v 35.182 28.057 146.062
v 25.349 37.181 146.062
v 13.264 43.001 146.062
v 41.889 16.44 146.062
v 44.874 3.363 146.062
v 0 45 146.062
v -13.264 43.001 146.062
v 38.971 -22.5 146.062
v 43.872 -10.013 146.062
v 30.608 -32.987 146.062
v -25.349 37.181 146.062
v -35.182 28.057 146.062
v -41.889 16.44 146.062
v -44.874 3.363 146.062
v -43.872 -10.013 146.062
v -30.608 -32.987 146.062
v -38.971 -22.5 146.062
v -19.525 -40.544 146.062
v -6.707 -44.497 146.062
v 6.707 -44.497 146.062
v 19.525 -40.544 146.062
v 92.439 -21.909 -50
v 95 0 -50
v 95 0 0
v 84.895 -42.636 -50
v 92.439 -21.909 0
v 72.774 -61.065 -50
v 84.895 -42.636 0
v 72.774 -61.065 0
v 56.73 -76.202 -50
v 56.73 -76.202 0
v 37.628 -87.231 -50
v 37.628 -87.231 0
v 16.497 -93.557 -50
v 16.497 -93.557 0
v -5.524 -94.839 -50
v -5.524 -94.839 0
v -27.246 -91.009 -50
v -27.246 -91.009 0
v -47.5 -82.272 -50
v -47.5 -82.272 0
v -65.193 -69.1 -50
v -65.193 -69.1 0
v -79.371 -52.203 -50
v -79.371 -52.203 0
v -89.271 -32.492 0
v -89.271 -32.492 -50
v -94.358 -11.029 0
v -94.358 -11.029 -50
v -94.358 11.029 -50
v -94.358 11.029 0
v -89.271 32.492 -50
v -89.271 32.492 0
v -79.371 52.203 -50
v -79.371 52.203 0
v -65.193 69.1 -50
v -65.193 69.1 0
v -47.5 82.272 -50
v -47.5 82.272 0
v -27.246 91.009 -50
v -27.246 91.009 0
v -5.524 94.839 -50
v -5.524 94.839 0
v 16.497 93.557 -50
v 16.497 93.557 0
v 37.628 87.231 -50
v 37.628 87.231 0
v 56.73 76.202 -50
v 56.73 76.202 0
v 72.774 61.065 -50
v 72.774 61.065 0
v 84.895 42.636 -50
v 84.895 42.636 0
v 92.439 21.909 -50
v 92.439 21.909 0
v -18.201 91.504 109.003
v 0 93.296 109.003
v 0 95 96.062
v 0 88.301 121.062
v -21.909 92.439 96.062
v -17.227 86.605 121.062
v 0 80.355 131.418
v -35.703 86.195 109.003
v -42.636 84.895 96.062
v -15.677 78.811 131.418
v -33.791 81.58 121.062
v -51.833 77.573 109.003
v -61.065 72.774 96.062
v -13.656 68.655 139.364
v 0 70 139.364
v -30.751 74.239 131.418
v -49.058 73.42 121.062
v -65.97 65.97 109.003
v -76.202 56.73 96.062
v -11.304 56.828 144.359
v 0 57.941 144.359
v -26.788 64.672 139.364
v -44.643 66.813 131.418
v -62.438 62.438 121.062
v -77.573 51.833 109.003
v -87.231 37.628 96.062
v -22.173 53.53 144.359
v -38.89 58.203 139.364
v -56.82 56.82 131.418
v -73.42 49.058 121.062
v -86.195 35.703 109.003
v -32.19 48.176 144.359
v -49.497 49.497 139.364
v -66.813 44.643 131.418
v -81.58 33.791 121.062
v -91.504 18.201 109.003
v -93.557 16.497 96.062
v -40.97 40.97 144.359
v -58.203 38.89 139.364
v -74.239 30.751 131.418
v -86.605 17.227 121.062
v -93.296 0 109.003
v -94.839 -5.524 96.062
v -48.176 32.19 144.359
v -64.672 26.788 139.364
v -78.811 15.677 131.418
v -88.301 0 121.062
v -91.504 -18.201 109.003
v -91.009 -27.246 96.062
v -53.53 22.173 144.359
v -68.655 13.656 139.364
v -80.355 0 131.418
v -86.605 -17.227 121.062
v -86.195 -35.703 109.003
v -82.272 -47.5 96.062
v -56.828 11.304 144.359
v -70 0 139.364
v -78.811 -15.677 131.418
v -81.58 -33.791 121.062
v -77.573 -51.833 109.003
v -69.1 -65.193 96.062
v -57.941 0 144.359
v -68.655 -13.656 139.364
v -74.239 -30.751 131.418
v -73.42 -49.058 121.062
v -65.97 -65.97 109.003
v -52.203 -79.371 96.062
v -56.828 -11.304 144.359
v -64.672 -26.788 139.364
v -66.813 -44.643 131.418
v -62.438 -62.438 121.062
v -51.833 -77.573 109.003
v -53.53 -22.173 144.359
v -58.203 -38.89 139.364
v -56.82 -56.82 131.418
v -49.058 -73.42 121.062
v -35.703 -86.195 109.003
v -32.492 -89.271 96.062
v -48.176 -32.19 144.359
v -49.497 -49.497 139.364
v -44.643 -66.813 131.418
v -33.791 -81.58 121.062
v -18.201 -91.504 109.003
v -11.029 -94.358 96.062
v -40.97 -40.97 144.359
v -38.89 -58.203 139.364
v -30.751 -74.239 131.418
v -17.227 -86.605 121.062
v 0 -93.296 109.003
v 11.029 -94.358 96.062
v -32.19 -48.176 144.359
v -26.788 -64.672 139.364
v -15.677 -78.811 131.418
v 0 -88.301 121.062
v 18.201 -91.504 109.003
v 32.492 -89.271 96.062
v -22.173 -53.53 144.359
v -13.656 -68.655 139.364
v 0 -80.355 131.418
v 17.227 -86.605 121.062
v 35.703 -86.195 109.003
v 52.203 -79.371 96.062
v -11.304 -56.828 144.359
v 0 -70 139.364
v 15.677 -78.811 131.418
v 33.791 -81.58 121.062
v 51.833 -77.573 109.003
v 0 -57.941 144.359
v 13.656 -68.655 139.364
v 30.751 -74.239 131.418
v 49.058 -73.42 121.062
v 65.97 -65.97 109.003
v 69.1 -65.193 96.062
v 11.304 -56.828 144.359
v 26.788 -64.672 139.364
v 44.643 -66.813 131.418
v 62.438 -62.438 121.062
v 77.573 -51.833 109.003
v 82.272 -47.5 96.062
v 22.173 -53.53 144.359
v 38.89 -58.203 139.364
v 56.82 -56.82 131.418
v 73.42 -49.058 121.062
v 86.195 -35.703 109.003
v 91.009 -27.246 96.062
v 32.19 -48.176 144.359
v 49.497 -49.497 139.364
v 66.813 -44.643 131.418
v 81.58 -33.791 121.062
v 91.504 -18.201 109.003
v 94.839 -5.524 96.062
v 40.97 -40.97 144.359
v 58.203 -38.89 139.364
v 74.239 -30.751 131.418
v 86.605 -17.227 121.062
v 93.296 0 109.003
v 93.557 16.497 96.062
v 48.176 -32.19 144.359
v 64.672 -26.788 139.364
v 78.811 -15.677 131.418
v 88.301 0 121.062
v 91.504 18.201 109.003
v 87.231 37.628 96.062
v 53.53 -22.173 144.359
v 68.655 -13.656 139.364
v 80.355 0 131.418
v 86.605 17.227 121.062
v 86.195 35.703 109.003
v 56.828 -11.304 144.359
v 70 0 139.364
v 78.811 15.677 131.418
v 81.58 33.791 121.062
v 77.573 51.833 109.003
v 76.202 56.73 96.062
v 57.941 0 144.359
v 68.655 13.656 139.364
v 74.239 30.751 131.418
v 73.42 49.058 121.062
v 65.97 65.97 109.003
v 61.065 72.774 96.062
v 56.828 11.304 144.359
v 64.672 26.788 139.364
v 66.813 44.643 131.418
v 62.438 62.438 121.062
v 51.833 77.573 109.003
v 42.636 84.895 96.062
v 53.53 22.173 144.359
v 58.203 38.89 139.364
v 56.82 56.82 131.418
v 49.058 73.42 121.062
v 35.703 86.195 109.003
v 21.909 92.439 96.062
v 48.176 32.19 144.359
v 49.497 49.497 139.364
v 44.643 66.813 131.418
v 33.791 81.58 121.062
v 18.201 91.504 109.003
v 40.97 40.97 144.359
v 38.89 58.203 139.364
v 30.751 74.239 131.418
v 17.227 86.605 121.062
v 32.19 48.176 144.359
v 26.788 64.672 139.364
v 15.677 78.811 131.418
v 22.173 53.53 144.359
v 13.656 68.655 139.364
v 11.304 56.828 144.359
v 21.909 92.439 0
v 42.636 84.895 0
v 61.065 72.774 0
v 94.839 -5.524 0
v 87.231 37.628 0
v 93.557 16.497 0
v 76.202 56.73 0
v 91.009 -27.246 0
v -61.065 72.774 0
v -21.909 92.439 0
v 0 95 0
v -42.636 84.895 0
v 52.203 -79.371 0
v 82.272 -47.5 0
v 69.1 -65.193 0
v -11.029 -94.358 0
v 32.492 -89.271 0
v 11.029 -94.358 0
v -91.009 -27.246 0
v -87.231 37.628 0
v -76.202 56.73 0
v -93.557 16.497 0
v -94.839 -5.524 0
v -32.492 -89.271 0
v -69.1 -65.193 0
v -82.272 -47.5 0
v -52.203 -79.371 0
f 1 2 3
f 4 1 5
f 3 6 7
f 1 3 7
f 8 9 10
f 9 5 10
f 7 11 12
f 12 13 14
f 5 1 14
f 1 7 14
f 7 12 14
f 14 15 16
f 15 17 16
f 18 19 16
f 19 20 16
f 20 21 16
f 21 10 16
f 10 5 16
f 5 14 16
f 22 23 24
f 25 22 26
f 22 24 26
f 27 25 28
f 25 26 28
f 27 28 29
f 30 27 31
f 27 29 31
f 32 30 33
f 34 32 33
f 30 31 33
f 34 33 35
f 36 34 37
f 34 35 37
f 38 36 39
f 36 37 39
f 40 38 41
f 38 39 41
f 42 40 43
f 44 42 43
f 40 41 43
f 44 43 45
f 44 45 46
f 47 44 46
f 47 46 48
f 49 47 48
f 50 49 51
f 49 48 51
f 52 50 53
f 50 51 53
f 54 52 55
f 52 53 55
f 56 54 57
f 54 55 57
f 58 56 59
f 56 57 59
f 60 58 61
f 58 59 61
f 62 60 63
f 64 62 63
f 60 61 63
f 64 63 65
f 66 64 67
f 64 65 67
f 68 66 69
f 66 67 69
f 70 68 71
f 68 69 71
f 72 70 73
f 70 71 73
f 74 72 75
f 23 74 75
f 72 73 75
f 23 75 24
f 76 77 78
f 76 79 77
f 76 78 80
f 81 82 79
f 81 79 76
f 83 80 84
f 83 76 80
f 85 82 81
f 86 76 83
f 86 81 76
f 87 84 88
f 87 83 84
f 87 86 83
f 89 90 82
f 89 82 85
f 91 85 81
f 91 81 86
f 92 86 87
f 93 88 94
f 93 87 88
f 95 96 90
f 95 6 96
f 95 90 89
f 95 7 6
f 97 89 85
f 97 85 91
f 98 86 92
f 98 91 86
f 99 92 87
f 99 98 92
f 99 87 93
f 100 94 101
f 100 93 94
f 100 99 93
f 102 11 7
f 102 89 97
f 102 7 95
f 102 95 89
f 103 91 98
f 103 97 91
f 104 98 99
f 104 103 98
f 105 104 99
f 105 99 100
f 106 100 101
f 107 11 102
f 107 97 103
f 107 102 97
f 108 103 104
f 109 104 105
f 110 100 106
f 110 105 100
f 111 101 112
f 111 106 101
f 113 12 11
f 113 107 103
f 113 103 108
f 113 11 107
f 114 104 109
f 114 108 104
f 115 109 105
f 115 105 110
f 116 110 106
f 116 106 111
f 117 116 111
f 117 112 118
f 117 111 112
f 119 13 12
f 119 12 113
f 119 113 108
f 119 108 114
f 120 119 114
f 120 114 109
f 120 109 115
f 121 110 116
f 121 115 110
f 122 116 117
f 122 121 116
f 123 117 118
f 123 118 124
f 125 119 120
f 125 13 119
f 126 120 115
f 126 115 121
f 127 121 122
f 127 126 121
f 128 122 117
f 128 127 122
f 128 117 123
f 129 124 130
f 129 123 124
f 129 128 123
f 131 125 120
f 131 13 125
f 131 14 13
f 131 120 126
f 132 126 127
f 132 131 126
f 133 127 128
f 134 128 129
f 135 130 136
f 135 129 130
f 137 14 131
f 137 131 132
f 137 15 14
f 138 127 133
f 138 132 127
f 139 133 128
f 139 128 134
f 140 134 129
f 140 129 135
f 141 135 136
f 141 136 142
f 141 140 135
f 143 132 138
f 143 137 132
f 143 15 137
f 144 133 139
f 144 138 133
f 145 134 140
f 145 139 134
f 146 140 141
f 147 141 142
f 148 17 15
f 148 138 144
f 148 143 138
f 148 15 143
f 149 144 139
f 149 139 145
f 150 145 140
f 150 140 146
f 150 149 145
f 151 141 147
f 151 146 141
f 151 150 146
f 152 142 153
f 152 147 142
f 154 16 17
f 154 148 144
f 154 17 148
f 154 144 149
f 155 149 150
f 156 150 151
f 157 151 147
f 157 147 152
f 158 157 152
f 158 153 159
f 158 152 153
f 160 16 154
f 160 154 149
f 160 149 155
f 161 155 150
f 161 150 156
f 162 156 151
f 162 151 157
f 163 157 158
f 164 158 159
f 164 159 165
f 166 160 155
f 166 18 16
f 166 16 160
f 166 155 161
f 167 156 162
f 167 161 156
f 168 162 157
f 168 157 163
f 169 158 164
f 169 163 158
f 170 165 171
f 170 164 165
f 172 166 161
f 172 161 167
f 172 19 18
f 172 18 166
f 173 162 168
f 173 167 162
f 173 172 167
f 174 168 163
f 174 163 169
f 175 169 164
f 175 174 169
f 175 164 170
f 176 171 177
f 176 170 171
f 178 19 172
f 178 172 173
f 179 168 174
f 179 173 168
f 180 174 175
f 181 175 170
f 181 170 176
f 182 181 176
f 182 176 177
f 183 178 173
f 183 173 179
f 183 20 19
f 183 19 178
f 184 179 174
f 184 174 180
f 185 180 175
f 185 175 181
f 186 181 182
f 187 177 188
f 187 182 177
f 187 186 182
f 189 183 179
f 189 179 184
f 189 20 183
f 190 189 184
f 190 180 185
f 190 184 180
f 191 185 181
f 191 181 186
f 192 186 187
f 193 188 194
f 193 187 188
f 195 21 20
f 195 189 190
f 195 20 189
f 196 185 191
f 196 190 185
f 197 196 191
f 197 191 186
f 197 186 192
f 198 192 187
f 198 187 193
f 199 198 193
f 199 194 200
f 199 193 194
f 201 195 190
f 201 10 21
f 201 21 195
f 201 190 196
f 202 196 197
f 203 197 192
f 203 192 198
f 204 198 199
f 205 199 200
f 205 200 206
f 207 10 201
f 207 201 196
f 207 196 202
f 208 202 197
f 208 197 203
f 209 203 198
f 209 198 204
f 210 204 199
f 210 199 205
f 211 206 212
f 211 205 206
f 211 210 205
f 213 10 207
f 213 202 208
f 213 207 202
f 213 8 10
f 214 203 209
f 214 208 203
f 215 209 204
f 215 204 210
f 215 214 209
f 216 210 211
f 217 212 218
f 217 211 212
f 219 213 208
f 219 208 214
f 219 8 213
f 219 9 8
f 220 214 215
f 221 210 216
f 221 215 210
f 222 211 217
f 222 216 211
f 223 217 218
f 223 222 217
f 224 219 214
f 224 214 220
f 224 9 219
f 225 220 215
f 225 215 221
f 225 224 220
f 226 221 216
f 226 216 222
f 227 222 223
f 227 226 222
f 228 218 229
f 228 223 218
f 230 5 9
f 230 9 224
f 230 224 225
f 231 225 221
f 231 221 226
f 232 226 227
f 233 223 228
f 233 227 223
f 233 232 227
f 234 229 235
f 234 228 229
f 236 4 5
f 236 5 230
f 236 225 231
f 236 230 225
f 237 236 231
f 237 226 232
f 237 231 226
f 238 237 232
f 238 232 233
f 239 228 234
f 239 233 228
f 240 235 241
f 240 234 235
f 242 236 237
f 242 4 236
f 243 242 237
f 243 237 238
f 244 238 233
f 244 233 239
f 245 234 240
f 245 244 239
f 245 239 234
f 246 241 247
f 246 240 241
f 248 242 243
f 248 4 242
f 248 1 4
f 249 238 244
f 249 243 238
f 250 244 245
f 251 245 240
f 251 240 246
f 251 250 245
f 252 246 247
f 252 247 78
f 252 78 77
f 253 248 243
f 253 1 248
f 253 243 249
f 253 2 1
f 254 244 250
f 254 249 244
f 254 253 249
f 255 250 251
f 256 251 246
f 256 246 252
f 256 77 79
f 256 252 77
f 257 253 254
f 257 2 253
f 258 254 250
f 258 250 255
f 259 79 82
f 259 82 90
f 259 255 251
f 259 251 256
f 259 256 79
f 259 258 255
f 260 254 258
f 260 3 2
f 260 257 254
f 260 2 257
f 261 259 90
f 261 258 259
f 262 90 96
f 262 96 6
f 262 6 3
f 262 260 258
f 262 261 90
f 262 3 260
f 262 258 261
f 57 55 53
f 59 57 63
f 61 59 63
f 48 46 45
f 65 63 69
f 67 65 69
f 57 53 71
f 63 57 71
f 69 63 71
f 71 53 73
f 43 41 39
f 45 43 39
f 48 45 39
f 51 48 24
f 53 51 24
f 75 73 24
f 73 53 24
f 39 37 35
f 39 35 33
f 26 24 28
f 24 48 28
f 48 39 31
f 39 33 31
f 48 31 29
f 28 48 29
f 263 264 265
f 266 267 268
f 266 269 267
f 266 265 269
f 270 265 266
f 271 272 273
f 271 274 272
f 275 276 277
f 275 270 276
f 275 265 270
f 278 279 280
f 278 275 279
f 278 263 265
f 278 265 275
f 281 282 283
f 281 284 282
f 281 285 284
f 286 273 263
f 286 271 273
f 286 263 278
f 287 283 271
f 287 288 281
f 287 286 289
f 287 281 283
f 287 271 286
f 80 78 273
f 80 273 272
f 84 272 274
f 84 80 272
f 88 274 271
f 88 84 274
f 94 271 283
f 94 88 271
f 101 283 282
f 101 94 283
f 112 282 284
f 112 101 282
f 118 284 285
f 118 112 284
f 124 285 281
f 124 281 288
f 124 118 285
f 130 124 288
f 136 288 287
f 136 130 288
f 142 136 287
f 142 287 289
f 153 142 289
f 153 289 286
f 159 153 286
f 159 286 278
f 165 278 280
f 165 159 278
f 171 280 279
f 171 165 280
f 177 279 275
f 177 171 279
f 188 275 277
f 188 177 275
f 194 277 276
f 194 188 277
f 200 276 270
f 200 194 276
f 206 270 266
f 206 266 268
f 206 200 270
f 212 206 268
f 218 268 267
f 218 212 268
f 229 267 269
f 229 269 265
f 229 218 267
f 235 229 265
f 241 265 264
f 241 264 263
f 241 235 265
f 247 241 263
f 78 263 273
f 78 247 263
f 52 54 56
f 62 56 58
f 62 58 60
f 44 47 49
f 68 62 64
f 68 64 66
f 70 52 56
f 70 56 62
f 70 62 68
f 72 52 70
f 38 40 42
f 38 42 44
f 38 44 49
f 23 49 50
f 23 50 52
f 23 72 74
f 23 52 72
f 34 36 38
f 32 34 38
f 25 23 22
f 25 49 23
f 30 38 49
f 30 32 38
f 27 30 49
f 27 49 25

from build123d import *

# Parameters (mm, degrees)
F0_W     = 95
F0_H     = 146.062418
F2_R     = 50
F3_R     = 95
F4_DEPTH = 50


with BuildPart() as f1:
    # F0 (on Right) → F1 (revolve)
    with BuildSketch(Plane.YZ):
        with Locations((47.5, 73.031209)):
            Rectangle(F0_W, F0_H)
    revolve(axis=Axis((0, 0, 73.031209), (0, 0, 1)))

    # F2
    f2_edges = [f1.edges().sort_by_distance(p)[0] for p in [
        (0, -95, 146.062418),
    ]]
    fillet(f2_edges, radius=F2_R)


with BuildPart() as f4:
    # F3 (on face) → F4 (new body)
    with BuildSketch(Plane(origin=(0, 0, 0), x_dir=(1, 0, 0), z_dir=(0, 0, -1))):
        Circle(F3_R)
    extrude(amount=F4_DEPTH)


solid = Compound([f1.part, f4.part])
